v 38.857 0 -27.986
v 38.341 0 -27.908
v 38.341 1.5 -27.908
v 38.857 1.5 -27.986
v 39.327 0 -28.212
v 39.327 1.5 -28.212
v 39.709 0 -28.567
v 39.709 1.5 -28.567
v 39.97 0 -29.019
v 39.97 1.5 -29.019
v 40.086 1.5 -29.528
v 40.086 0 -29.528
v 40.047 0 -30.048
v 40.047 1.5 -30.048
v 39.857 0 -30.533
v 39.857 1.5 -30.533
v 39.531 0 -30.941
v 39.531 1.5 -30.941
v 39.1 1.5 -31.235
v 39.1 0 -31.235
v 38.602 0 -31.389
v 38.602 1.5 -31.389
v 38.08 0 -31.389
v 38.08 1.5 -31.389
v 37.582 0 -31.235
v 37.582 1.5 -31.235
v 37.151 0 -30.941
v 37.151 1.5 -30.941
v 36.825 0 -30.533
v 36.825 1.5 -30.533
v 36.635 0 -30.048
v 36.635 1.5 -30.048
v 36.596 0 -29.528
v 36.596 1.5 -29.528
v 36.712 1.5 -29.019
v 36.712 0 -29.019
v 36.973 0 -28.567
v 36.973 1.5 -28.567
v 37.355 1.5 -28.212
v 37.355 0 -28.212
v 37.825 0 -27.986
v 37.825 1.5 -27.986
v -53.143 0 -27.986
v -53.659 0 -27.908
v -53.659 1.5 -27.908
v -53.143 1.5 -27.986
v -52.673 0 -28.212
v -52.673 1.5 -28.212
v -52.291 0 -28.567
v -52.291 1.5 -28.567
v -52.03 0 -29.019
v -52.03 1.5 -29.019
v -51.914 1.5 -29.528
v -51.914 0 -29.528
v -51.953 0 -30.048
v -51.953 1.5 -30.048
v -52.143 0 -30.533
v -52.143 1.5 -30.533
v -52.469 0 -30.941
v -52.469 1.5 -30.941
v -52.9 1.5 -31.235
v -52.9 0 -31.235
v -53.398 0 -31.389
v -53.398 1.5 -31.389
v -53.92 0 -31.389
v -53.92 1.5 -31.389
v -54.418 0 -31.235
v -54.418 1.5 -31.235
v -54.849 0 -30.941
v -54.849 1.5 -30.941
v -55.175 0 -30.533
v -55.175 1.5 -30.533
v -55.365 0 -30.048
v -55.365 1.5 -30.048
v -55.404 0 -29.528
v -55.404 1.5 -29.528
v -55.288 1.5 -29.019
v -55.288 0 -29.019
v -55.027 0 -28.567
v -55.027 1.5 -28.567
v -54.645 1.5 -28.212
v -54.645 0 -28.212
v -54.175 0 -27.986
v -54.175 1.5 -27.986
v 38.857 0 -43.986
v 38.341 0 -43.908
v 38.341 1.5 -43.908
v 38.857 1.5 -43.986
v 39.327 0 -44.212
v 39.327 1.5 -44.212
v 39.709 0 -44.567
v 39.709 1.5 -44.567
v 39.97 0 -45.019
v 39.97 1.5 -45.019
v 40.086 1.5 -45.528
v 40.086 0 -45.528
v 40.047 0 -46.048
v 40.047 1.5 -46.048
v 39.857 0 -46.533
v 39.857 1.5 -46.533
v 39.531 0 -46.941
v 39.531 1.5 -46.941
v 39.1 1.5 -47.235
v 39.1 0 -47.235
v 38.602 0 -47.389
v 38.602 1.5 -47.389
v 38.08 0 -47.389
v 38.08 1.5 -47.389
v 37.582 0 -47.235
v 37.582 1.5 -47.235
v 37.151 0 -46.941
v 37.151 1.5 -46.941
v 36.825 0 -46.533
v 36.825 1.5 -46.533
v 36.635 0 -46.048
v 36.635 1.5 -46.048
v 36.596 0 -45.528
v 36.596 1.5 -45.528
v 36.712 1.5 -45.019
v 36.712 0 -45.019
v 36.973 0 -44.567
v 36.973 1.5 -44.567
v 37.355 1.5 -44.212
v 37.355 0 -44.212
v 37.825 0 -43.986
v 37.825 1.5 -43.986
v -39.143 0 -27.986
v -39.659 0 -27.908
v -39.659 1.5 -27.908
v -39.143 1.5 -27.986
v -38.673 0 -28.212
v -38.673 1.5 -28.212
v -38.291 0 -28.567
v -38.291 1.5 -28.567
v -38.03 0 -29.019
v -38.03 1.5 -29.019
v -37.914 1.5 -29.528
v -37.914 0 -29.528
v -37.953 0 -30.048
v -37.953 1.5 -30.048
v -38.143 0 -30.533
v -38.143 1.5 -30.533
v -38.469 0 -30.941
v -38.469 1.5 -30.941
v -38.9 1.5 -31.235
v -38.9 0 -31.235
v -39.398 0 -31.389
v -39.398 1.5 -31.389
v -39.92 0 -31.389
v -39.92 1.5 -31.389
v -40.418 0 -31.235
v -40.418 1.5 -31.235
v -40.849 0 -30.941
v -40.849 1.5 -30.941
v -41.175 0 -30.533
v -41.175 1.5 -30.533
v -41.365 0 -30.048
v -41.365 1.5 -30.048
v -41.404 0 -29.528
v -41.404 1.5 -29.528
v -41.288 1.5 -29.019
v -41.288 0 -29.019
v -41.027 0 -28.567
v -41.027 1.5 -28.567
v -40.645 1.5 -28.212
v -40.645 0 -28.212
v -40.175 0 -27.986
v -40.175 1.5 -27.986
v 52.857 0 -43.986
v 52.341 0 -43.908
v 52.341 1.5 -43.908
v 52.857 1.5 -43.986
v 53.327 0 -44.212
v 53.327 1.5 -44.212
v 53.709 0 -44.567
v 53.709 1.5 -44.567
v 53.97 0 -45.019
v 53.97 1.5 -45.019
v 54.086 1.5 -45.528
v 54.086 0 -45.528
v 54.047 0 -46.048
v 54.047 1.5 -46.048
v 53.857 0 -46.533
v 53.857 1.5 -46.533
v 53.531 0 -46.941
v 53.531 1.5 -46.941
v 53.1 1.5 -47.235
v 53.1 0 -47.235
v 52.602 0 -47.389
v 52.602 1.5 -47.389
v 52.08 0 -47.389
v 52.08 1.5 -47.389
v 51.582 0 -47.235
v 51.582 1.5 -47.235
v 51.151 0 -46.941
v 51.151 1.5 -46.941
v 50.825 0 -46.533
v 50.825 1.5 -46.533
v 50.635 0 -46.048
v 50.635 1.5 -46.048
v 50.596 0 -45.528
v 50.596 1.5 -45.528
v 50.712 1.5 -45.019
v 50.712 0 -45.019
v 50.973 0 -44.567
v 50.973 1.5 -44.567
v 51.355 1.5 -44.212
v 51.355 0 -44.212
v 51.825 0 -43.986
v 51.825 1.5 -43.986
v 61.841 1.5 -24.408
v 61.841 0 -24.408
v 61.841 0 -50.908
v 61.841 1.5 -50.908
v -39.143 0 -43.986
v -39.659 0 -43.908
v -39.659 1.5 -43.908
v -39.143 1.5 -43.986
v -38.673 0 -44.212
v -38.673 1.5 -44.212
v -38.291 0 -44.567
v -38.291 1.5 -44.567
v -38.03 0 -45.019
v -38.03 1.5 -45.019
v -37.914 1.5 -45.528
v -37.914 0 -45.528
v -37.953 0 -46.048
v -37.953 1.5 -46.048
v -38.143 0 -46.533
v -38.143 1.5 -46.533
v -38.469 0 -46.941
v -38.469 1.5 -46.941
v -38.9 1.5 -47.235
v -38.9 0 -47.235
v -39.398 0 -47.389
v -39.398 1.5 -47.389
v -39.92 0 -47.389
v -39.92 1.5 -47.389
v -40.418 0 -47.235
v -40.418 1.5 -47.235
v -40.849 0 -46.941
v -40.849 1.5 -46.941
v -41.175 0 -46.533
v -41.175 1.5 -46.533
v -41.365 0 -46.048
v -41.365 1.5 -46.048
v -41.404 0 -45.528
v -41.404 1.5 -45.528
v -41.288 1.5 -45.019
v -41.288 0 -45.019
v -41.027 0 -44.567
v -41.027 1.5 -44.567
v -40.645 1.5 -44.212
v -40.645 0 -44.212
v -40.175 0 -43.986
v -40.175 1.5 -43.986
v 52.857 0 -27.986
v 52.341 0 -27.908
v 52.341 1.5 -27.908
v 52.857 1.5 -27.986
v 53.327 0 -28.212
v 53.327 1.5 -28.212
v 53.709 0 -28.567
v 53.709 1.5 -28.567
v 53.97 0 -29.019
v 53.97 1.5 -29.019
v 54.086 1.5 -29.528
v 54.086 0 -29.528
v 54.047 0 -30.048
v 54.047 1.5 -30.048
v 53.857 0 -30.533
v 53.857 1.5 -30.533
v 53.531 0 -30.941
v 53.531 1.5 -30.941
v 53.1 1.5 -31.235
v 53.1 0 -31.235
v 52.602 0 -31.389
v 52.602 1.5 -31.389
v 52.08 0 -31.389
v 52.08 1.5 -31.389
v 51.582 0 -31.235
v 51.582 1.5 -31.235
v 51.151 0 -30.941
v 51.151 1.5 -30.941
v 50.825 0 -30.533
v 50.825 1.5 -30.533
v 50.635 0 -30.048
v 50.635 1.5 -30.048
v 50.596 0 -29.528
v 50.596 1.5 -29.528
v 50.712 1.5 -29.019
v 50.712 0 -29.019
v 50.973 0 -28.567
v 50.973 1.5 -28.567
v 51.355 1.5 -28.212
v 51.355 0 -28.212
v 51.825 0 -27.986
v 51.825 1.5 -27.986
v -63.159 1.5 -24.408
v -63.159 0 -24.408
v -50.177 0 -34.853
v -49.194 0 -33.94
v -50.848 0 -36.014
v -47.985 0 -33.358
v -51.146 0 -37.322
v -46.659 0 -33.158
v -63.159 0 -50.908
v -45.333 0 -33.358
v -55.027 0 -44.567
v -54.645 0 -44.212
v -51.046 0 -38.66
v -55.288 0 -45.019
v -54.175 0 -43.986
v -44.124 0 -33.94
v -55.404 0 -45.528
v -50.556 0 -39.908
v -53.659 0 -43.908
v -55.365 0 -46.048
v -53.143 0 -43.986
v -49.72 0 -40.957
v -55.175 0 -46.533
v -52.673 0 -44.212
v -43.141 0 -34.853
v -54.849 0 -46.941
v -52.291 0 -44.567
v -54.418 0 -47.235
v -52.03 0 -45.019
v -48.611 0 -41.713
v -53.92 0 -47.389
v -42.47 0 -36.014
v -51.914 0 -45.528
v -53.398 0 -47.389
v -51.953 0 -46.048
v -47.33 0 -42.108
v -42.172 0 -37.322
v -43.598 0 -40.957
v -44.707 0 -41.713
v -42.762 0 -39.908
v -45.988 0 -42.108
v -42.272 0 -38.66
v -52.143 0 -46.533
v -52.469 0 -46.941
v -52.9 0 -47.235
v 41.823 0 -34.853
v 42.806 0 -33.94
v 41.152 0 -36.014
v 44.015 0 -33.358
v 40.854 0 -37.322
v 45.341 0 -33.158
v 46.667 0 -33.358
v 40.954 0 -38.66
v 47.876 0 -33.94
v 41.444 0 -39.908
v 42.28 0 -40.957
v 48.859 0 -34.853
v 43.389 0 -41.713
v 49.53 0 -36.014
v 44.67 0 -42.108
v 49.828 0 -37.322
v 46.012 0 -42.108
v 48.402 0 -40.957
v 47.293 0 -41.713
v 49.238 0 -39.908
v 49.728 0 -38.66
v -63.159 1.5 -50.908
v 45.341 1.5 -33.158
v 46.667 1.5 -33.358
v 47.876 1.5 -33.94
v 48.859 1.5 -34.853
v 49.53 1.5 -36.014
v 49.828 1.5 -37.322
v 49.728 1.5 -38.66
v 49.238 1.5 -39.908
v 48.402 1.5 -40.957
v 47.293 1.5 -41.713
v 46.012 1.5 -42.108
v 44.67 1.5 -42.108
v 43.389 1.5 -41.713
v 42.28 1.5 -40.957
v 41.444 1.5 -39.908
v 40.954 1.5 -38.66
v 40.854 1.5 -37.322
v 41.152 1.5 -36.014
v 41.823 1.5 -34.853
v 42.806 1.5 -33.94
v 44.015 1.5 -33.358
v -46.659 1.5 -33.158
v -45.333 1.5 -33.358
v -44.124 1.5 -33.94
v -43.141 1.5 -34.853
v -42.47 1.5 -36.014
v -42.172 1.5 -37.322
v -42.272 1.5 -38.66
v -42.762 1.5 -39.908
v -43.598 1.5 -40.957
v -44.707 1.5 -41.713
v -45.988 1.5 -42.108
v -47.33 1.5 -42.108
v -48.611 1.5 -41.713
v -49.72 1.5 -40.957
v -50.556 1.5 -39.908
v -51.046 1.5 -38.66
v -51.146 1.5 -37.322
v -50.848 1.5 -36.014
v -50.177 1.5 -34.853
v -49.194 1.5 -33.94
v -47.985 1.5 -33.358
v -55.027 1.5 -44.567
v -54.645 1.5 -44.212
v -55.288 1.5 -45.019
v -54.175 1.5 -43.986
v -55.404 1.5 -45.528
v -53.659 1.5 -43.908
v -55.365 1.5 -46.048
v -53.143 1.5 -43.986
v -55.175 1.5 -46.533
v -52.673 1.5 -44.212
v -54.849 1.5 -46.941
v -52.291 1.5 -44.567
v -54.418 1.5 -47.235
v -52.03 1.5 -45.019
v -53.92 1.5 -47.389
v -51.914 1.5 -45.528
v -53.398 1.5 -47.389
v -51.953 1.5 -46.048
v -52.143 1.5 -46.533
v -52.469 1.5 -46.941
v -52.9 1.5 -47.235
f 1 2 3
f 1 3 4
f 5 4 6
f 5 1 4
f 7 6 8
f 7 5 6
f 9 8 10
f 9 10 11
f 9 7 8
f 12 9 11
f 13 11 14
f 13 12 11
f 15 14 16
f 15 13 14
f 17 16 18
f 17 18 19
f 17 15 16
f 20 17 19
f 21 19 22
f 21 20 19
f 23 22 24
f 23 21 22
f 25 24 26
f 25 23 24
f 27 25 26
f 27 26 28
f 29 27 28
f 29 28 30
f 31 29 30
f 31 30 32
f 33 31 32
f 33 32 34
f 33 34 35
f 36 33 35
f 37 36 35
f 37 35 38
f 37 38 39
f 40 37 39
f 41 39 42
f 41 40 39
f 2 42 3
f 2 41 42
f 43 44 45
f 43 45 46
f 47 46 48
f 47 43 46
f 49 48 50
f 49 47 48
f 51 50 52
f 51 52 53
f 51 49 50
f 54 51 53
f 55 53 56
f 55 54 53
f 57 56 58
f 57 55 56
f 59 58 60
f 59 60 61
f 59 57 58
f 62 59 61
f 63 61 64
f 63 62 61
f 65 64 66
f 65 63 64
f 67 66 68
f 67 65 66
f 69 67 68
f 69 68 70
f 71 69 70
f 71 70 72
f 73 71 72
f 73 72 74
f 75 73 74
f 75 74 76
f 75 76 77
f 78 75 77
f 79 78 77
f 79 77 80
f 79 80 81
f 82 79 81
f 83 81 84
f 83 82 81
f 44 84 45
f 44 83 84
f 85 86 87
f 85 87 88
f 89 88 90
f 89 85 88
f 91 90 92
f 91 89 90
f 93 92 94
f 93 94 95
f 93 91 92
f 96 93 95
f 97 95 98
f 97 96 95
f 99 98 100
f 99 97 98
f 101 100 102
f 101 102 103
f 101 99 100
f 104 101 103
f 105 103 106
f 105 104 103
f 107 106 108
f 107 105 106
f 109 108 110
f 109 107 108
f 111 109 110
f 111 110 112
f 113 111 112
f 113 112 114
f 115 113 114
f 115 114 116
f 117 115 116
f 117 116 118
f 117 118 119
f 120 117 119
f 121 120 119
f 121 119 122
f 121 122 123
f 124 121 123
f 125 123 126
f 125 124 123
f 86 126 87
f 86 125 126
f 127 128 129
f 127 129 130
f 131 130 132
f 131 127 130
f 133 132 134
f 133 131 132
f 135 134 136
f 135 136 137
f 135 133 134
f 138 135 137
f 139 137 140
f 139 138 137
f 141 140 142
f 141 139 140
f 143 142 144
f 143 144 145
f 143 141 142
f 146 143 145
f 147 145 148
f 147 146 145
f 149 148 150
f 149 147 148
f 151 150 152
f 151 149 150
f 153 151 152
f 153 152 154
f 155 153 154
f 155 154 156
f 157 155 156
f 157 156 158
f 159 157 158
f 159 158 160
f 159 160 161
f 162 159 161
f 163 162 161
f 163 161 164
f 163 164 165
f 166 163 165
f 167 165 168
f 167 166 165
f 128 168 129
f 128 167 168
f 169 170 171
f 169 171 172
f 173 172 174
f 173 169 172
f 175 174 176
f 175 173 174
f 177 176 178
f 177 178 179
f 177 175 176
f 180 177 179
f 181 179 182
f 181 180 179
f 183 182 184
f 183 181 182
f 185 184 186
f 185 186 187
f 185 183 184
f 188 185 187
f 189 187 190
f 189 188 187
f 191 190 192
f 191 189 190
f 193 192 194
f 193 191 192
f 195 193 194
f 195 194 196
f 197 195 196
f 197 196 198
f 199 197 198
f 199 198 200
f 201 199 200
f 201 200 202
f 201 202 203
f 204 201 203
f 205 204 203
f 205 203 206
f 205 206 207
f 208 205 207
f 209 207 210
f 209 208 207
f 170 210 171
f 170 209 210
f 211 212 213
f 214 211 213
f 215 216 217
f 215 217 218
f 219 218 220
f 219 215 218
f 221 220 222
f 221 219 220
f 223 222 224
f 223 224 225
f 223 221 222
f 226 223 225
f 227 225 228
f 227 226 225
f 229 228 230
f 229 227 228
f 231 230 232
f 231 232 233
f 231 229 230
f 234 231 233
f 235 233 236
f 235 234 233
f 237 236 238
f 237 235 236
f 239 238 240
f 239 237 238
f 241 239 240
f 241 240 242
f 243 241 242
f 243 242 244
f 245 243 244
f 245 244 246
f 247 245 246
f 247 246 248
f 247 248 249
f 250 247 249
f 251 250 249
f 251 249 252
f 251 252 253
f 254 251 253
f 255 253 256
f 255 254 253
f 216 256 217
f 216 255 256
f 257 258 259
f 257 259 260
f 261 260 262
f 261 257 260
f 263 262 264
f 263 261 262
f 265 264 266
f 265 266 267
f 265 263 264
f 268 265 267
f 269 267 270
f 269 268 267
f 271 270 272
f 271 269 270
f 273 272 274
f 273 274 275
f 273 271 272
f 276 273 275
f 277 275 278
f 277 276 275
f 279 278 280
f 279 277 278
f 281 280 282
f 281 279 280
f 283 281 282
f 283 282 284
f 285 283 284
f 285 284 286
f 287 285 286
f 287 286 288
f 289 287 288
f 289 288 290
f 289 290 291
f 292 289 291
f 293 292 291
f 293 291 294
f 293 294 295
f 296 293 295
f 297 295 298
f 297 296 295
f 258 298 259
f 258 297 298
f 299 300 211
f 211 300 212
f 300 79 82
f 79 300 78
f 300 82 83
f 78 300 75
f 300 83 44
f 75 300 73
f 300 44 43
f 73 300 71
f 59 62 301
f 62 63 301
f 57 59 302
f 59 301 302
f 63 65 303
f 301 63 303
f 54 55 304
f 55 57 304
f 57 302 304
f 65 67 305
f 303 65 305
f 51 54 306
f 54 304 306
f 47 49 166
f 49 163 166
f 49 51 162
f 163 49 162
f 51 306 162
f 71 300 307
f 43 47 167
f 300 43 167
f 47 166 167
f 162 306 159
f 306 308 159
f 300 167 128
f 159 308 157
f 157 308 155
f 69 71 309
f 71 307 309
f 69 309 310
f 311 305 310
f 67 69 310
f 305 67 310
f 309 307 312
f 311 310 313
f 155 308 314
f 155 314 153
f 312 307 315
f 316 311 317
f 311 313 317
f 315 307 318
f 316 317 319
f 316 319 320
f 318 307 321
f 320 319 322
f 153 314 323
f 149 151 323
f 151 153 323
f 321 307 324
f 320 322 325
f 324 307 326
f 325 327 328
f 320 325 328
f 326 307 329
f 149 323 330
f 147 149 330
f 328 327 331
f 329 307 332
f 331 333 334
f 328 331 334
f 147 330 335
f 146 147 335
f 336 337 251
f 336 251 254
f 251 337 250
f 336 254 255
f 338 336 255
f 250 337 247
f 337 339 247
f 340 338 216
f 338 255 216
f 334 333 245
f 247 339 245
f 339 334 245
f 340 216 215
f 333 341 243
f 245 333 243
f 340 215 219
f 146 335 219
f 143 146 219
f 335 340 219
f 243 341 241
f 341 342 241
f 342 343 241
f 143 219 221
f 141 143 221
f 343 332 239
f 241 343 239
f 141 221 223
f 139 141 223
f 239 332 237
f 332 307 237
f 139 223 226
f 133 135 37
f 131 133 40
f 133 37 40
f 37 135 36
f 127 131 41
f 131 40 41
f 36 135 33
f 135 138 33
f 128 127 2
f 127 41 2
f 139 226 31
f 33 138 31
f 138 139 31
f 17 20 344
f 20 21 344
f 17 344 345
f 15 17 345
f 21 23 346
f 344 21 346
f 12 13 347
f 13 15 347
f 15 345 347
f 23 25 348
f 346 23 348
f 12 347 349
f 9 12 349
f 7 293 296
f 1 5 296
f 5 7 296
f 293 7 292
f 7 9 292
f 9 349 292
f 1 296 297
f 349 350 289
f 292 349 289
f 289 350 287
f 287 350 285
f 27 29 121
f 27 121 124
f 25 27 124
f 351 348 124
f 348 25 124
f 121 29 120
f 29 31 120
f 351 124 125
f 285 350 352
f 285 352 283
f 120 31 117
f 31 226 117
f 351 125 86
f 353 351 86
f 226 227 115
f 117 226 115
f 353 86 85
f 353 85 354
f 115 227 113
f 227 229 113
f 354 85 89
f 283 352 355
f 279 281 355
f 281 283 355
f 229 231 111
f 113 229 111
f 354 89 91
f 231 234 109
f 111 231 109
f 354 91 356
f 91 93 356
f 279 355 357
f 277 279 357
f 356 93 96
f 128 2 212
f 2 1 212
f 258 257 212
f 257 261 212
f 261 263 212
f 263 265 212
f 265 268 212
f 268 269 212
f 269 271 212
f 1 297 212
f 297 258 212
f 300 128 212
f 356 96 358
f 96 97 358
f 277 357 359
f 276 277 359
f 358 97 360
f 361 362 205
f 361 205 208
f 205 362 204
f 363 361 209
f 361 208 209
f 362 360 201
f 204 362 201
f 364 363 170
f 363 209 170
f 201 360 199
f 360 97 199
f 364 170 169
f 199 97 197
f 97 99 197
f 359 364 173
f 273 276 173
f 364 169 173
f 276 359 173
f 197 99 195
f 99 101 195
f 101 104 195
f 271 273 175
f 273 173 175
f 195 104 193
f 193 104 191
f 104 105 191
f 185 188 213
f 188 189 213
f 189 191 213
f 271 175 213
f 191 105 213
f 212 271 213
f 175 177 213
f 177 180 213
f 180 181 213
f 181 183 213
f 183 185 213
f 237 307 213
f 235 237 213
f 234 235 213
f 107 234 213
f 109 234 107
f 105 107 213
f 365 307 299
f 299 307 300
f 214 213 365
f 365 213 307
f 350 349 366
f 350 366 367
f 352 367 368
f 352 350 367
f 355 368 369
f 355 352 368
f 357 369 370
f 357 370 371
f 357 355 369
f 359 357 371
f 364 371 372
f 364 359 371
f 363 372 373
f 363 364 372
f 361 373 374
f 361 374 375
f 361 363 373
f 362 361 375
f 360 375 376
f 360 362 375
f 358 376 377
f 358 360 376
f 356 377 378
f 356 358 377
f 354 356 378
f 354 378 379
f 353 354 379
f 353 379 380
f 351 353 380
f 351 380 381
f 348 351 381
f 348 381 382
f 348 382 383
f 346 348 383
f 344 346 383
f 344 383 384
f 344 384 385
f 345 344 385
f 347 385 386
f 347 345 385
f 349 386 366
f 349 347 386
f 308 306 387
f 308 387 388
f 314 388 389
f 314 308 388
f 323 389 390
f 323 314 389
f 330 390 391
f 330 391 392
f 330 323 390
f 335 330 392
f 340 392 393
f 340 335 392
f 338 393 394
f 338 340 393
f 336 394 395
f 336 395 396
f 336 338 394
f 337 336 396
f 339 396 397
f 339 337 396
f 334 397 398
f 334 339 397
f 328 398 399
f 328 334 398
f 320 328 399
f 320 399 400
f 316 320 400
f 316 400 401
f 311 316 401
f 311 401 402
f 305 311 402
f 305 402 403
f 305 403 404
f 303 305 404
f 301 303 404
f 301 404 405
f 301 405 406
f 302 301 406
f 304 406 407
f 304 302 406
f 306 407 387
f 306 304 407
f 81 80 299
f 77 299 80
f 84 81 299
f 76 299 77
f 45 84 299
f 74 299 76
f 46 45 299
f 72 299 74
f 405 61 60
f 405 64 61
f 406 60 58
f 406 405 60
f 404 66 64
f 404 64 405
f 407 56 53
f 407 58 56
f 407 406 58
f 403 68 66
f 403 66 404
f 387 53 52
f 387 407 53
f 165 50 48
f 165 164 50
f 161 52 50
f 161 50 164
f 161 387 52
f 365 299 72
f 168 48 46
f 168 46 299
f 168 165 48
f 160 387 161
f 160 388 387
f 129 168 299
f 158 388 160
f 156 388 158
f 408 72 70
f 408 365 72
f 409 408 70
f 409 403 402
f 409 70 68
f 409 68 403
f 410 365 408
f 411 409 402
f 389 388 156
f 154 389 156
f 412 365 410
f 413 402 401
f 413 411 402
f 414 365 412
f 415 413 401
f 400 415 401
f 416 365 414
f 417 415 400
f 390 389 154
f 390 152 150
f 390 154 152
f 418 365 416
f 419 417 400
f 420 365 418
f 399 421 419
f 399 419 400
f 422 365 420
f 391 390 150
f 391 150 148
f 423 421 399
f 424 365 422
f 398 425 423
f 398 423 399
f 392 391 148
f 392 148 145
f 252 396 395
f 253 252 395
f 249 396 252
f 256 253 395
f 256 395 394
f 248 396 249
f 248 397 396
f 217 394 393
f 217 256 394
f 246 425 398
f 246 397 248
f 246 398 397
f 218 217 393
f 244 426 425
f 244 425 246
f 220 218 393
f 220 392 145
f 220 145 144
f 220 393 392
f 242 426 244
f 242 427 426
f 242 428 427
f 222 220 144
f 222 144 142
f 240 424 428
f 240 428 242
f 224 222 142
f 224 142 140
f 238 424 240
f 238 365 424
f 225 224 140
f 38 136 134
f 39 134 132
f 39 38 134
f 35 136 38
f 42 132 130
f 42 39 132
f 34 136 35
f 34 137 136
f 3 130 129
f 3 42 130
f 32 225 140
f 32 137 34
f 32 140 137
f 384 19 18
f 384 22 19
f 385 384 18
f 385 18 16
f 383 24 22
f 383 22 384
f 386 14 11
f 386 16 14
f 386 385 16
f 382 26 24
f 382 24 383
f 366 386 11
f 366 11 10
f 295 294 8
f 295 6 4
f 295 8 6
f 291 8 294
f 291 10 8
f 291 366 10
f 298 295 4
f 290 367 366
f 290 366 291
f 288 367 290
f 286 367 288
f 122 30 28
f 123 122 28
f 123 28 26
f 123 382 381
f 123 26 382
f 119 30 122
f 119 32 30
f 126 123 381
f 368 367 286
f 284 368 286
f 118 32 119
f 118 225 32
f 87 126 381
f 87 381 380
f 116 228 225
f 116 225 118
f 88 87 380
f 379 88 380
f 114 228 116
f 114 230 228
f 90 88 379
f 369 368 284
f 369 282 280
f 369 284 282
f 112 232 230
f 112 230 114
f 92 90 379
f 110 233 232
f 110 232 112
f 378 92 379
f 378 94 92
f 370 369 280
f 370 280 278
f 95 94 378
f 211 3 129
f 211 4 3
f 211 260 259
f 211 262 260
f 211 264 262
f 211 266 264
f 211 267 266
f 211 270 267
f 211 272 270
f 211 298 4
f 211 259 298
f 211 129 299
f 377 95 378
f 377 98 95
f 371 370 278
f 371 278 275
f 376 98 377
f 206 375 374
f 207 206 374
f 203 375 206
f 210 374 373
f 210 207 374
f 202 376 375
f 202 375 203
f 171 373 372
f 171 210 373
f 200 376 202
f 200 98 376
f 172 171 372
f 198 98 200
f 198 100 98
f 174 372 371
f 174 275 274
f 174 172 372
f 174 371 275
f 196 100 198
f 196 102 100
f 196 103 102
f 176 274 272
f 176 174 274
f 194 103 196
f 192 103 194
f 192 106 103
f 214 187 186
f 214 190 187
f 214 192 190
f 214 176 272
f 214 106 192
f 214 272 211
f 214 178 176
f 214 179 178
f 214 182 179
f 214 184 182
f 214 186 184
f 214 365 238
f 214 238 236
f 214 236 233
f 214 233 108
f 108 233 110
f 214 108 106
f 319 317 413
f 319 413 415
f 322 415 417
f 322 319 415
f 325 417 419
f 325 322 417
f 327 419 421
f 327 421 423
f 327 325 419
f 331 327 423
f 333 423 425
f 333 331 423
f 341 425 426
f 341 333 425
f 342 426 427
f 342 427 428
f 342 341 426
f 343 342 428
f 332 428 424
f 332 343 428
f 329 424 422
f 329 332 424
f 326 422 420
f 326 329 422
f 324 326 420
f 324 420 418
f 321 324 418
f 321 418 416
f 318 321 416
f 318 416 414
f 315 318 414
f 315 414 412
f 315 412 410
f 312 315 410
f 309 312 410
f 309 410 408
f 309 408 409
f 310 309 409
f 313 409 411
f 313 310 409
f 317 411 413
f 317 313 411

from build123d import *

# Parameters (mm, degrees)
SKETCH4_R           = 1.75
SKETCH4_R_2         = 4.5
BOSS_EXTRUDE1_DEPTH = 1.5


with BuildPart() as part:
    # Sketch4 → Boss-Extrude1 (new body)
    with BuildSketch(Plane(origin=(0, 0, 0), x_dir=(1, 0, 0), z_dir=(0, 1, 0))):
        Polygon((-30.158983798, 50.908297492), (-63.158983798, 50.908297492), (-63.158983798, 24.408297492), (-30.158983798, 24.408297492), (28.841016202, 24.408297492), (61.841016202, 24.408297492), (61.841016202, 50.908297492), (28.841016202, 50.908297492), align=None)
        with Locations(Location((-53.658983798, 29.658297492, 0), (0, 0, 270))):
            Circle(SKETCH4_R, mode=Mode.SUBTRACT)
        with Locations(Location((-39.658983798, 29.658297492, 0), (0, 0, 270))):
            Circle(SKETCH4_R, mode=Mode.SUBTRACT)
        with Locations(Location((38.341016202, 29.658297492, 0), (0, 0, 270))):
            Circle(SKETCH4_R, mode=Mode.SUBTRACT)
        with Locations(Location((52.341016202, 29.658297492, 0), (0, 0, 270))):
            Circle(SKETCH4_R, mode=Mode.SUBTRACT)
        with Locations(Location((-46.658983798, 37.658297492, 0), (0, 0, 270))):
            Circle(SKETCH4_R_2, mode=Mode.SUBTRACT)
        with Locations(Location((-53.658983798, 45.658297492, 0), (0, 0, 270))):
            Circle(SKETCH4_R, mode=Mode.SUBTRACT)
        with Locations(Location((-39.658983798, 45.658297492, 0), (0, 0, 270))):
            Circle(SKETCH4_R, mode=Mode.SUBTRACT)
        with Locations(Location((45.341016202, 37.658297492, 0), (0, 0, 270))):
            Circle(SKETCH4_R_2, mode=Mode.SUBTRACT)
        with Locations(Location((38.341016202, 45.658297492, 0), (0, 0, 270))):
            Circle(SKETCH4_R, mode=Mode.SUBTRACT)
        with Locations(Location((52.341016202, 45.658297492, 0), (0, 0, 270))):
            Circle(SKETCH4_R, mode=Mode.SUBTRACT)
    extrude(amount=BOSS_EXTRUDE1_DEPTH)


solid = part.part
